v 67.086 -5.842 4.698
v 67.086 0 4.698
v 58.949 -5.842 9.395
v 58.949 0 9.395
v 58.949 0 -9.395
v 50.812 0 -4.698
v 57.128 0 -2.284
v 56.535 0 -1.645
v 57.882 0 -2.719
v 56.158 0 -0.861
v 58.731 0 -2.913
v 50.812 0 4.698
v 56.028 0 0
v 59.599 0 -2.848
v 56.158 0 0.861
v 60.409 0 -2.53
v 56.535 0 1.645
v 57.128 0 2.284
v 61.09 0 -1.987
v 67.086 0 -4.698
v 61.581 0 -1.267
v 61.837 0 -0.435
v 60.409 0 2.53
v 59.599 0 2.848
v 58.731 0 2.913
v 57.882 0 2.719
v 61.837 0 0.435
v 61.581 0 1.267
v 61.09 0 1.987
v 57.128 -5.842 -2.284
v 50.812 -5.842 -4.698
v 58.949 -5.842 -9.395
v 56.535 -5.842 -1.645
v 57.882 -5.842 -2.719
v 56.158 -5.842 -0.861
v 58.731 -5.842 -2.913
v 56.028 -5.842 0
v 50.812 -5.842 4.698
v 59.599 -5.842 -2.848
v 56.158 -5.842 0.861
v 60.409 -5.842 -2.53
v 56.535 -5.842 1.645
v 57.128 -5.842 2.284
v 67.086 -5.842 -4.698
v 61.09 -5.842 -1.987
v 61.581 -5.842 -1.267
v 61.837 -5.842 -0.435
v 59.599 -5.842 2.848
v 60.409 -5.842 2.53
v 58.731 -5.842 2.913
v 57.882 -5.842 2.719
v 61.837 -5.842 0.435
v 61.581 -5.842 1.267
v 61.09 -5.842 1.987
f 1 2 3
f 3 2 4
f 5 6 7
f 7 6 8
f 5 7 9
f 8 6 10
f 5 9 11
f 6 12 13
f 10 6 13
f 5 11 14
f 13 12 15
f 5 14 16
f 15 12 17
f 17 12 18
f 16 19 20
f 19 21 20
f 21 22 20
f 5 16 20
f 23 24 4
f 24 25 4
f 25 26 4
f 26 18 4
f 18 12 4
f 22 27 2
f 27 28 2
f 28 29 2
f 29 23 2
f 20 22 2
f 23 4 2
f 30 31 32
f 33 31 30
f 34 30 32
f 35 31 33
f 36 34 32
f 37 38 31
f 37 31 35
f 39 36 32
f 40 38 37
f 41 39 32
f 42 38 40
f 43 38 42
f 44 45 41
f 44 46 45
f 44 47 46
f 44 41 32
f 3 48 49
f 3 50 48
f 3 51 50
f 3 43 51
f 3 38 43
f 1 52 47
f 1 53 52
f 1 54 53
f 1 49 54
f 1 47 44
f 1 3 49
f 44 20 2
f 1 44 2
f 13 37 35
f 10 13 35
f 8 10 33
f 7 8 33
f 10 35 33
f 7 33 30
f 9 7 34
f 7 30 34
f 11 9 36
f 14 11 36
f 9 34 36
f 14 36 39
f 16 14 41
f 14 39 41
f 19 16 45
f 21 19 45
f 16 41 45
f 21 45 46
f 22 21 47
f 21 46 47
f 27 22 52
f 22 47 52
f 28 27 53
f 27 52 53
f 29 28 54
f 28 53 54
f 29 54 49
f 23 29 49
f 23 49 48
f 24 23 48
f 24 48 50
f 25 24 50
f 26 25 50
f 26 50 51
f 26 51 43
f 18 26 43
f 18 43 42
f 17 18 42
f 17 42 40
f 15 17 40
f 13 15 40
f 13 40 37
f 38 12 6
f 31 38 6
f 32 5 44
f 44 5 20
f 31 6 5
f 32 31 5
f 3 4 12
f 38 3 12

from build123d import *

# Parameters (mm, degrees)
F1_DEPTH = 5.842
F2_D     = 5.842


# Not quite as in the source:
# - a feature names something its author has since deleted; it is built from what else it names


with BuildPart() as f1:
    # F0 (on Front) → F1 (new body)
    with BuildSketch(Plane.XZ):
        Polygon((58.9488451577, 9.395414032), (50.8121779269, 4.697707016), (50.8121779269, -4.697707016), (58.9488451577, -9.395414032), (67.0855123886, -4.697707016), (67.0855123886, 4.697707016), align=None)
    extrude(amount=F1_DEPTH)

    # F2 (through all)
    with Locations(Plane(origin=(0, 0, 0), x_dir=(1, 0, 0), z_dir=(0, 1, 0))):
        with Locations((58.9488451577, 0)):
            Hole(F2_D / 2)


solid = f1.part
